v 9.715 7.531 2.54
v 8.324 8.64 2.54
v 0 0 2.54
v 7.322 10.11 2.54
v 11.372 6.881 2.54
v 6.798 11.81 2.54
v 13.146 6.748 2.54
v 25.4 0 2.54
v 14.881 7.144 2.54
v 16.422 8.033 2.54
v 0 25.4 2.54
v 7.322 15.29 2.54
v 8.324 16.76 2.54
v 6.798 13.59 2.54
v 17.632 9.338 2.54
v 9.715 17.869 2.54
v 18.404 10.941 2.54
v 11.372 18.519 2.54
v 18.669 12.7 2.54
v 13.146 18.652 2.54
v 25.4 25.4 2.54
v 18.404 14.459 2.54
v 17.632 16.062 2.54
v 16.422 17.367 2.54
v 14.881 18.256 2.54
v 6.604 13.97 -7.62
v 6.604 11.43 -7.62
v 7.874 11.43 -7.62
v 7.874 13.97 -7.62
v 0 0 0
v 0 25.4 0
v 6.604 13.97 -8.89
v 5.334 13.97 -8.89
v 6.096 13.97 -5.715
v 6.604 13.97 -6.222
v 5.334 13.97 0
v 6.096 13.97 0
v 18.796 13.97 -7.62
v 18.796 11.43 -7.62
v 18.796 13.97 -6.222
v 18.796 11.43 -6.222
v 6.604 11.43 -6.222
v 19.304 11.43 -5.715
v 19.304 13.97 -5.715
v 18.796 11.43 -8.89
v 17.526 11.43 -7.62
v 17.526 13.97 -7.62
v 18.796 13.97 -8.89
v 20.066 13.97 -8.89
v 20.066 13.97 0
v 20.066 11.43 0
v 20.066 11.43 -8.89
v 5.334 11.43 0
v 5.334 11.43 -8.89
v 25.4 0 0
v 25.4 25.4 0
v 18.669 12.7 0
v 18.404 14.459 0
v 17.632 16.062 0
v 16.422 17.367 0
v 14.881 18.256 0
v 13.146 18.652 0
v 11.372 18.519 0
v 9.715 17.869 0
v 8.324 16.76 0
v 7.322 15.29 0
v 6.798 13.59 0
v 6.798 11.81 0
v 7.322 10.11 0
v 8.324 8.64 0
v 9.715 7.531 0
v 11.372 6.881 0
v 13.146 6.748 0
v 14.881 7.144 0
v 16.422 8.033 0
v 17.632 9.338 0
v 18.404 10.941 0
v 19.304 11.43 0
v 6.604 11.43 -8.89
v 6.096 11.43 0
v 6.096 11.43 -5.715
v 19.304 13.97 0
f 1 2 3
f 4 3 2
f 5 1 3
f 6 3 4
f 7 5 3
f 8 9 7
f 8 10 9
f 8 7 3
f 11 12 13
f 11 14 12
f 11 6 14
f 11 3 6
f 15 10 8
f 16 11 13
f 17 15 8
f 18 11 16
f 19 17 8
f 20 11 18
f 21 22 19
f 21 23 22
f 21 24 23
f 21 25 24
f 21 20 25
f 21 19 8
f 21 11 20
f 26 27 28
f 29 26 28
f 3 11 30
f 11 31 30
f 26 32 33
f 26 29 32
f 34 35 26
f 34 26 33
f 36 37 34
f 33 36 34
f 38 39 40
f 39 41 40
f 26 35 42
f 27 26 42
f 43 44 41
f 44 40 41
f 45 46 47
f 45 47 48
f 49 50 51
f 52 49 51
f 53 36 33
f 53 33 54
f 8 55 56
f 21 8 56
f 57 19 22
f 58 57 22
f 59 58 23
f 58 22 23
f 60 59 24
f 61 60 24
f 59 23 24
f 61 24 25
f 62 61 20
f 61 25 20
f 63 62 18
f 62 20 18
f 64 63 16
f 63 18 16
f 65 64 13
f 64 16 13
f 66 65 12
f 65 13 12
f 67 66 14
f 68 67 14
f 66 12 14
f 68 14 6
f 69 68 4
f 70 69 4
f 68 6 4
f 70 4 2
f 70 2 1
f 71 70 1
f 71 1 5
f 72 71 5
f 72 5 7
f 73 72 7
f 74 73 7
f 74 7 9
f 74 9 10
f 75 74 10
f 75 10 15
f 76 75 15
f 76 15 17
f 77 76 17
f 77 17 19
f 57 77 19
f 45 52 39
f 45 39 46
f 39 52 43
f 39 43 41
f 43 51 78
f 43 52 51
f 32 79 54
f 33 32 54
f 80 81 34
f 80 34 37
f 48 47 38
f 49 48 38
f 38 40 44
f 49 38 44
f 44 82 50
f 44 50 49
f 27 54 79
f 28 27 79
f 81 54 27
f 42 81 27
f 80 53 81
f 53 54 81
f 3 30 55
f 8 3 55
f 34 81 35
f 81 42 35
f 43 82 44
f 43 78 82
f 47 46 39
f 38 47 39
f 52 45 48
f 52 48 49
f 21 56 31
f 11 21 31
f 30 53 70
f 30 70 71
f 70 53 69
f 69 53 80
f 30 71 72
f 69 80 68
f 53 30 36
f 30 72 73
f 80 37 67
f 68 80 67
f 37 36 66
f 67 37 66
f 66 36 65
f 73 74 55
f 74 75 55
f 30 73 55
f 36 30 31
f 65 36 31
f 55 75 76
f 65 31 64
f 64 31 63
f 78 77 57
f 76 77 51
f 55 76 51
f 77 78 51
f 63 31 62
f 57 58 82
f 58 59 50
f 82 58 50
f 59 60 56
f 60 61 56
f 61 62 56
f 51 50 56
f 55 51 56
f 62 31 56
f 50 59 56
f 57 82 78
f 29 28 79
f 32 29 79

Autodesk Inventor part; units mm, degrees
ref_plane "YZ Plane" through (0, 0, 0) normal (1, 0, 0) x (0, 1, 0)
ref_plane "XZ Plane" through (0, 0, 0) normal (0, 1, 0) x (-1, 0, 0)
ref_plane "XY Plane" through (0, 0, 0) normal (0, 0, 1) x (1, 0, 0)
sketch "Sketch1" plane through (0, 0, 0) normal (0, 0, 1) x (1, 0, 0)
  line L0 (0, 0) -> (25.4, 0)
  line L1 (25.4, 0) -> (25.4, 25.4)
  line L2 (25.4, 25.4) -> (0, 25.4)
  line L3 (0, 25.4) -> (0, 0)
  dimension "d0" = 25.4
  dimension "d1" = 25.4
extrude "Extrusion1" add sketch "Sketch1" along normal blind 2.54
sketch "Sketch2" plane through (0, 0, 2.54) normal (0, 0, 1) x (1, 0, 0)
  circle A0 centre (12.7, 12.7) radius 5.969
  line L0 (25.4, 25.4) -> (0, 25.4) projected
  line L1 (25.4, 0) -> (25.4, 25.4) projected
  point P0 (0, 0)
  dimension "d4" = 12.7
  dimension "d5" = 12.7
  dimension "d8" = 11.938
extrude "Extrusion2" cut sketch "Sketch2" against normal blind 2.54
sketch "Sketch3" plane through (0, 0, 0) normal (0, 0, -1) x (-1, 0, 0)
  line L0 (-18.796, 18.796) -> (-6.604, 18.796)
  line L1 (-6.604, 18.796) -> (-6.604, 6.604)
  line L2 (-6.604, 6.604) -> (-18.796, 6.604)
  line L3 (-18.796, 6.604) -> (-18.796, 18.796)
  line L4 (-25.4, 25.4) -> (0, 25.4) projected
  line L5 (0, 25.4) -> (0, 0) projected
  line L6 (-6.604, 13.97) -> (-5.334, 13.97)
  line L7 (-5.334, 13.97) -> (-5.334, 11.43)
  line L8 (-5.334, 11.43) -> (-6.604, 11.43)
  line L9 (-6.604, 11.43) -> (-6.604, 13.97)
  line L10 (-18.796, 13.97) -> (-20.066, 13.97)
  line L11 (-20.066, 13.97) -> (-20.066, 11.43)
  line L12 (-20.066, 11.43) -> (-18.796, 11.43)
  line L13 (-18.796, 11.43) -> (-18.796, 13.97)
  dimension "d9" = 12.192
  dimension "d10" = 12.192
  dimension "d11" = 6.604
  dimension "d12" = 6.604
  dimension "d13" = 1.27
  dimension "d14" = 1.27
  dimension "d15" = 2.54
  dimension "d16" = 11.43
  dimension "d17" = 2.54
extrude "Extrusion3" add sketch "Sketch3" along normal blind 7.62 contours L3 L12 L11 L10 | L6 L7 L8 L1
sketch "Sketch4" plane through (18.796, 11.43, 0) normal (0, -1, 0) x (1, 0, 0)
  line L0 (0, -7.62) -> (1.27, -7.62) projected
  line L1 (1.27, -7.62) -> (-1.27, -7.62)
  line L2 (-1.27, -7.62) -> (-1.27, -8.89)
  line L3 (-1.27, -8.89) -> (1.27, -8.89)
  line L4 (1.27, -8.89) -> (1.27, -7.62)
  line L5 (-1.27, -7.62) -> (0, -8.89)
  line L6 (-12.192, -7.62) -> (-13.462, -7.62) projected
  line L7 (-13.462, -7.62) -> (-10.922, -7.62)
  line L8 (-10.922, -7.62) -> (-10.922, -8.89)
  line L9 (-10.922, -8.89) -> (-13.462, -8.89)
  line L10 (-13.462, -8.89) -> (-13.462, -7.62)
  line L11 (-10.922, -7.62) -> (-12.192, -8.89)
  point P0 (-18.796, 0)
  dimension "d20" = 1.27
  dimension "d21" = 2.54
  dimension "d22" = 2.54
  dimension "d23" = 1.27
extrude "Extrusion4" add sketch "Sketch4" against normal blind 2.54 contours L0 L4 L3 L5 L1 | L7 L11 L9 L10 L6
sketch "Sketch5" plane through (18.796, 11.43, 0) normal (0, -1, 0) x (1, 0, 0)
  line L0 (6.604, 0) -> (-18.796, 0) projected
  line L1 (0.508, -5.715) -> (-12.7, -5.715)
  line L2 (-12.7, -5.715) -> (-12.7, 0)
  line L3 (-12.7, 0) -> (0.508, 0)
  line L4 (0.508, 0) -> (0.508, -5.715)
  line L5 (-13.462, 0) -> (-13.462, -8.89) projected
  dimension "d26" = 13.208
  dimension "d27" = 0.762
  dimension "d28" = 5.715
extrude "Extrusion5" cut sketch "Sketch5" against normal blind 2.54
chamfer "Chamfer1" distance 0.508 angle 45 2 edges at (6.604, 12.7, -5.715) (18.796, 12.7, -5.715)
properties part number "TestButtonClip"
